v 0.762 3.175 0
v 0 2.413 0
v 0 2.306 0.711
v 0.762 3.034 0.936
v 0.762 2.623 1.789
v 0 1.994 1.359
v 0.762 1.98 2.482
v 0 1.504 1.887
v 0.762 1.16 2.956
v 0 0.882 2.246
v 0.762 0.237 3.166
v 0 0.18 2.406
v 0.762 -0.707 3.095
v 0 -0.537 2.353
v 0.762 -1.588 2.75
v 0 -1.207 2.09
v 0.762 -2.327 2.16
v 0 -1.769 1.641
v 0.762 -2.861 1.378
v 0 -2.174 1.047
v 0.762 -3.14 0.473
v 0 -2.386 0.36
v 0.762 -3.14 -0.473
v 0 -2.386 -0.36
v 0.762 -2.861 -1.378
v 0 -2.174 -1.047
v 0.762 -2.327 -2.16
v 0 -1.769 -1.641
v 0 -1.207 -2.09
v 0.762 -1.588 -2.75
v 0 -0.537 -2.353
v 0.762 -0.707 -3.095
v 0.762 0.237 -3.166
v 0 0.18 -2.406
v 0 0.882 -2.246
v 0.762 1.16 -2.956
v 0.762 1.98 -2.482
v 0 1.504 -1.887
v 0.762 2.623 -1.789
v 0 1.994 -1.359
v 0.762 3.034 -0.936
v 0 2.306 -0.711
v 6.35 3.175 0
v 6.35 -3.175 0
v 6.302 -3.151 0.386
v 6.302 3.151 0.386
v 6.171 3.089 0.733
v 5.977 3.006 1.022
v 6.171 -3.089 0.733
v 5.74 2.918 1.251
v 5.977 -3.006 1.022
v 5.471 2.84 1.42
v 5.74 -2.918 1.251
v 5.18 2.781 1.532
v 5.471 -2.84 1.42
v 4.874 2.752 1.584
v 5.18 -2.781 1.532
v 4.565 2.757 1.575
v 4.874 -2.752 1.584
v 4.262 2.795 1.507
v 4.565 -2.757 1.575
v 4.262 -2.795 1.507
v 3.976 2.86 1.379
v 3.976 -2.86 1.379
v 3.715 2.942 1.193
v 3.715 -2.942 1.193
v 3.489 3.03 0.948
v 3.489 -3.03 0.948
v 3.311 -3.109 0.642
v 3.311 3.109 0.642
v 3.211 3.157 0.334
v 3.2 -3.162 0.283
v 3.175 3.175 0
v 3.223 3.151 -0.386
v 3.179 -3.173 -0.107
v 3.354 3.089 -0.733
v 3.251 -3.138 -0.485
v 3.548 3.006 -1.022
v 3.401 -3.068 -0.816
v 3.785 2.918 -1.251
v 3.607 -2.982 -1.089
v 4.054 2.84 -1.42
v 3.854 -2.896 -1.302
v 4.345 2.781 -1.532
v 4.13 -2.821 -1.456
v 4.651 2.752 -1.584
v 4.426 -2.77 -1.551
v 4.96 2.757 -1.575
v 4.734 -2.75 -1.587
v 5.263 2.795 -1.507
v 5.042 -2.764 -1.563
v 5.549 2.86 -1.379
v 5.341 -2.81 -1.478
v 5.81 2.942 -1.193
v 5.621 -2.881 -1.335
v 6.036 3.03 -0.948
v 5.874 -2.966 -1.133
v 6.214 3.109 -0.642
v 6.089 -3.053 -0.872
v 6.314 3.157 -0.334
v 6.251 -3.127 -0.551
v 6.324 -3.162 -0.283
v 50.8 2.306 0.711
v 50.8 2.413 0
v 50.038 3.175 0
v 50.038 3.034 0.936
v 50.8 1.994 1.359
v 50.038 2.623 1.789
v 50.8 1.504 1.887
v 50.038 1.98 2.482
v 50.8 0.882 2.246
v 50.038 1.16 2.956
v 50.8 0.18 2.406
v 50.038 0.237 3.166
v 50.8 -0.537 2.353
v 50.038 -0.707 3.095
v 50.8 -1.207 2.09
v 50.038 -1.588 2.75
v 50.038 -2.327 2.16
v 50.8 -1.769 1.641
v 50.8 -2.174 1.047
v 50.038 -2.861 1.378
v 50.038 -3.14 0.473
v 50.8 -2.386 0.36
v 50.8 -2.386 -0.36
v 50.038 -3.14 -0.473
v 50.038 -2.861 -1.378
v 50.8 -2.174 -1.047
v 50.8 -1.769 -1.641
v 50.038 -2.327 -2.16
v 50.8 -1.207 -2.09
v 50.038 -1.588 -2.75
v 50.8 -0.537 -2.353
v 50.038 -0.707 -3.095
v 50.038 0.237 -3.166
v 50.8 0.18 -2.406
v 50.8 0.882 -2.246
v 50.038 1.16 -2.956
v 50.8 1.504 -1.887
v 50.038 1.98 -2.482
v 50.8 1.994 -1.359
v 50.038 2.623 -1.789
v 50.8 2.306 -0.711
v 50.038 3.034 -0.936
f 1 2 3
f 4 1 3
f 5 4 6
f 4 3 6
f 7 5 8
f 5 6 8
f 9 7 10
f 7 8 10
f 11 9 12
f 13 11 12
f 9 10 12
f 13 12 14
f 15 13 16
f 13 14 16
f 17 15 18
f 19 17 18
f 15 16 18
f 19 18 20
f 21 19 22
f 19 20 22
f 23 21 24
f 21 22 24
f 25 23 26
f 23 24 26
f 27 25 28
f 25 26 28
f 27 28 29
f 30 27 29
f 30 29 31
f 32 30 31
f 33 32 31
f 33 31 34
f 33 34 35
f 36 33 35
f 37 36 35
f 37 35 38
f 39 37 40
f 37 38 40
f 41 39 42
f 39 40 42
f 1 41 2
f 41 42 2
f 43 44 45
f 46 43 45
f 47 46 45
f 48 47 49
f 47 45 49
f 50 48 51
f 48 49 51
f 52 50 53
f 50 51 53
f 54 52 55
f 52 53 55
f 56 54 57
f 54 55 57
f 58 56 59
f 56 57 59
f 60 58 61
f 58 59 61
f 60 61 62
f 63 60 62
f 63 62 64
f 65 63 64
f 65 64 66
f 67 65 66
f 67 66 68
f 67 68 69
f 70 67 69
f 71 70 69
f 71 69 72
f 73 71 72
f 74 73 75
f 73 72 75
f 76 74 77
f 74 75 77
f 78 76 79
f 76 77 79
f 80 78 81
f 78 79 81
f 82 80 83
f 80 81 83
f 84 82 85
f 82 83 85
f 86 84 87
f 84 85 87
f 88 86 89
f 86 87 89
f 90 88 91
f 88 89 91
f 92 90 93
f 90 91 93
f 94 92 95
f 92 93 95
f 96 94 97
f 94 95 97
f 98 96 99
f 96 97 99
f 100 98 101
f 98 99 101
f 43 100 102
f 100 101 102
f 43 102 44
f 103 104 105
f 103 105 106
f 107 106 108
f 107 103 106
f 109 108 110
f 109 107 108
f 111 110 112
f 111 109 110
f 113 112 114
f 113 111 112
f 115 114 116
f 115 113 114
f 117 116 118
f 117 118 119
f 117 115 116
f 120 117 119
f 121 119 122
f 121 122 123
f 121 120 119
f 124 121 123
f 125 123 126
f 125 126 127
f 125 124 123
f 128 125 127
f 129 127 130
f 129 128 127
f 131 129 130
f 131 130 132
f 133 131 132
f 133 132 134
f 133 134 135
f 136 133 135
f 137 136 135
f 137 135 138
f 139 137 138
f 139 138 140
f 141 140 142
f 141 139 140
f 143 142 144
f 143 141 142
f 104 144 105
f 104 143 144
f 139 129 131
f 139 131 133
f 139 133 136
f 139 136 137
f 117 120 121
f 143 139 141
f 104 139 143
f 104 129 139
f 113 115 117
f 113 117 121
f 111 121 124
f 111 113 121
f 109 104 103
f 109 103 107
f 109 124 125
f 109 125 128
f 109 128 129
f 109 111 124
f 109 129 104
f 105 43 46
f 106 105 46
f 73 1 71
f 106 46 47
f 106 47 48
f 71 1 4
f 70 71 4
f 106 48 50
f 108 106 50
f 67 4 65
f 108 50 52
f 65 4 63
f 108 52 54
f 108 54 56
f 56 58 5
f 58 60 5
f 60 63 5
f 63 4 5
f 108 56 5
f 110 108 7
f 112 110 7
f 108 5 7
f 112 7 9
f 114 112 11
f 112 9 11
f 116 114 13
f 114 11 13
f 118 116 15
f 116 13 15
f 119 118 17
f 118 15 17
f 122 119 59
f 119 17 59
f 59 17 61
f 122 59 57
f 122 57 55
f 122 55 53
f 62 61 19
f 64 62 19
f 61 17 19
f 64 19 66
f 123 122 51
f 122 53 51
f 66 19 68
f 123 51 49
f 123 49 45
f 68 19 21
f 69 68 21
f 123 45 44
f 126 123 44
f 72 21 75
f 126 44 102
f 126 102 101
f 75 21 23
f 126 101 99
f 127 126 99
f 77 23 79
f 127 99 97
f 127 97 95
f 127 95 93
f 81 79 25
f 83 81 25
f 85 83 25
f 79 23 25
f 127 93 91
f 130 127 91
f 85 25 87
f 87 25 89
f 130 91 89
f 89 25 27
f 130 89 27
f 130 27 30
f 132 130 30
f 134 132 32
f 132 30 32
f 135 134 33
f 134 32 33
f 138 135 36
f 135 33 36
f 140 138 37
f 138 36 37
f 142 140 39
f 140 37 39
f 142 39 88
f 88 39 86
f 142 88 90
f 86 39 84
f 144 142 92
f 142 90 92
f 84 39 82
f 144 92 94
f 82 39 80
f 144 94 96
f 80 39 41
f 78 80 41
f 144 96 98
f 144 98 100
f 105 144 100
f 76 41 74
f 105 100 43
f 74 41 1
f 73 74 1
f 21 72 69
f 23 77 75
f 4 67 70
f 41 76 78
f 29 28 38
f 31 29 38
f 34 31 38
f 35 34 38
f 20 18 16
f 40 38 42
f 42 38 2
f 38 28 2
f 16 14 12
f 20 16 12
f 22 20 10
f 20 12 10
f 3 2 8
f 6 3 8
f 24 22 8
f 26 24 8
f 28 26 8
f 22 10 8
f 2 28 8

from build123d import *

# Parameters (mm, degrees)
F0_R     = 3.175
F1_DEPTH = 50.8
F2_SIZE  = 0.762
F3_R     = 1.5875
F4_DEPTH = 6.35


with BuildPart() as f1:
    # F0 (on Right) → F1 (new body)
    with BuildSketch(Plane.YZ):
        Circle(F0_R)
    extrude(amount=F1_DEPTH)

    # F2
    f2_edges = [f1.edges().sort_by_distance(p)[0] for p in [
        (25.4, 3.175, 0),
        (0, -3.175, 0),
        (50.8, -3.175, 0),
    ]]
    chamfer(f2_edges, length=F2_SIZE)


with BuildPart() as f4:
    # F3 (on Front) → F4 (new body, symmetric)
    with BuildSketch(Plane.XZ):
        with Locations((4.7625, 0)):
            Circle(F3_R)
    extrude(amount=F4_DEPTH, both=True)


with BuildPart() as f1_1:
    add(f1.part)

    # F5: cut F4
    add(f4.part, mode=Mode.SUBTRACT)


solid = f1_1.part
